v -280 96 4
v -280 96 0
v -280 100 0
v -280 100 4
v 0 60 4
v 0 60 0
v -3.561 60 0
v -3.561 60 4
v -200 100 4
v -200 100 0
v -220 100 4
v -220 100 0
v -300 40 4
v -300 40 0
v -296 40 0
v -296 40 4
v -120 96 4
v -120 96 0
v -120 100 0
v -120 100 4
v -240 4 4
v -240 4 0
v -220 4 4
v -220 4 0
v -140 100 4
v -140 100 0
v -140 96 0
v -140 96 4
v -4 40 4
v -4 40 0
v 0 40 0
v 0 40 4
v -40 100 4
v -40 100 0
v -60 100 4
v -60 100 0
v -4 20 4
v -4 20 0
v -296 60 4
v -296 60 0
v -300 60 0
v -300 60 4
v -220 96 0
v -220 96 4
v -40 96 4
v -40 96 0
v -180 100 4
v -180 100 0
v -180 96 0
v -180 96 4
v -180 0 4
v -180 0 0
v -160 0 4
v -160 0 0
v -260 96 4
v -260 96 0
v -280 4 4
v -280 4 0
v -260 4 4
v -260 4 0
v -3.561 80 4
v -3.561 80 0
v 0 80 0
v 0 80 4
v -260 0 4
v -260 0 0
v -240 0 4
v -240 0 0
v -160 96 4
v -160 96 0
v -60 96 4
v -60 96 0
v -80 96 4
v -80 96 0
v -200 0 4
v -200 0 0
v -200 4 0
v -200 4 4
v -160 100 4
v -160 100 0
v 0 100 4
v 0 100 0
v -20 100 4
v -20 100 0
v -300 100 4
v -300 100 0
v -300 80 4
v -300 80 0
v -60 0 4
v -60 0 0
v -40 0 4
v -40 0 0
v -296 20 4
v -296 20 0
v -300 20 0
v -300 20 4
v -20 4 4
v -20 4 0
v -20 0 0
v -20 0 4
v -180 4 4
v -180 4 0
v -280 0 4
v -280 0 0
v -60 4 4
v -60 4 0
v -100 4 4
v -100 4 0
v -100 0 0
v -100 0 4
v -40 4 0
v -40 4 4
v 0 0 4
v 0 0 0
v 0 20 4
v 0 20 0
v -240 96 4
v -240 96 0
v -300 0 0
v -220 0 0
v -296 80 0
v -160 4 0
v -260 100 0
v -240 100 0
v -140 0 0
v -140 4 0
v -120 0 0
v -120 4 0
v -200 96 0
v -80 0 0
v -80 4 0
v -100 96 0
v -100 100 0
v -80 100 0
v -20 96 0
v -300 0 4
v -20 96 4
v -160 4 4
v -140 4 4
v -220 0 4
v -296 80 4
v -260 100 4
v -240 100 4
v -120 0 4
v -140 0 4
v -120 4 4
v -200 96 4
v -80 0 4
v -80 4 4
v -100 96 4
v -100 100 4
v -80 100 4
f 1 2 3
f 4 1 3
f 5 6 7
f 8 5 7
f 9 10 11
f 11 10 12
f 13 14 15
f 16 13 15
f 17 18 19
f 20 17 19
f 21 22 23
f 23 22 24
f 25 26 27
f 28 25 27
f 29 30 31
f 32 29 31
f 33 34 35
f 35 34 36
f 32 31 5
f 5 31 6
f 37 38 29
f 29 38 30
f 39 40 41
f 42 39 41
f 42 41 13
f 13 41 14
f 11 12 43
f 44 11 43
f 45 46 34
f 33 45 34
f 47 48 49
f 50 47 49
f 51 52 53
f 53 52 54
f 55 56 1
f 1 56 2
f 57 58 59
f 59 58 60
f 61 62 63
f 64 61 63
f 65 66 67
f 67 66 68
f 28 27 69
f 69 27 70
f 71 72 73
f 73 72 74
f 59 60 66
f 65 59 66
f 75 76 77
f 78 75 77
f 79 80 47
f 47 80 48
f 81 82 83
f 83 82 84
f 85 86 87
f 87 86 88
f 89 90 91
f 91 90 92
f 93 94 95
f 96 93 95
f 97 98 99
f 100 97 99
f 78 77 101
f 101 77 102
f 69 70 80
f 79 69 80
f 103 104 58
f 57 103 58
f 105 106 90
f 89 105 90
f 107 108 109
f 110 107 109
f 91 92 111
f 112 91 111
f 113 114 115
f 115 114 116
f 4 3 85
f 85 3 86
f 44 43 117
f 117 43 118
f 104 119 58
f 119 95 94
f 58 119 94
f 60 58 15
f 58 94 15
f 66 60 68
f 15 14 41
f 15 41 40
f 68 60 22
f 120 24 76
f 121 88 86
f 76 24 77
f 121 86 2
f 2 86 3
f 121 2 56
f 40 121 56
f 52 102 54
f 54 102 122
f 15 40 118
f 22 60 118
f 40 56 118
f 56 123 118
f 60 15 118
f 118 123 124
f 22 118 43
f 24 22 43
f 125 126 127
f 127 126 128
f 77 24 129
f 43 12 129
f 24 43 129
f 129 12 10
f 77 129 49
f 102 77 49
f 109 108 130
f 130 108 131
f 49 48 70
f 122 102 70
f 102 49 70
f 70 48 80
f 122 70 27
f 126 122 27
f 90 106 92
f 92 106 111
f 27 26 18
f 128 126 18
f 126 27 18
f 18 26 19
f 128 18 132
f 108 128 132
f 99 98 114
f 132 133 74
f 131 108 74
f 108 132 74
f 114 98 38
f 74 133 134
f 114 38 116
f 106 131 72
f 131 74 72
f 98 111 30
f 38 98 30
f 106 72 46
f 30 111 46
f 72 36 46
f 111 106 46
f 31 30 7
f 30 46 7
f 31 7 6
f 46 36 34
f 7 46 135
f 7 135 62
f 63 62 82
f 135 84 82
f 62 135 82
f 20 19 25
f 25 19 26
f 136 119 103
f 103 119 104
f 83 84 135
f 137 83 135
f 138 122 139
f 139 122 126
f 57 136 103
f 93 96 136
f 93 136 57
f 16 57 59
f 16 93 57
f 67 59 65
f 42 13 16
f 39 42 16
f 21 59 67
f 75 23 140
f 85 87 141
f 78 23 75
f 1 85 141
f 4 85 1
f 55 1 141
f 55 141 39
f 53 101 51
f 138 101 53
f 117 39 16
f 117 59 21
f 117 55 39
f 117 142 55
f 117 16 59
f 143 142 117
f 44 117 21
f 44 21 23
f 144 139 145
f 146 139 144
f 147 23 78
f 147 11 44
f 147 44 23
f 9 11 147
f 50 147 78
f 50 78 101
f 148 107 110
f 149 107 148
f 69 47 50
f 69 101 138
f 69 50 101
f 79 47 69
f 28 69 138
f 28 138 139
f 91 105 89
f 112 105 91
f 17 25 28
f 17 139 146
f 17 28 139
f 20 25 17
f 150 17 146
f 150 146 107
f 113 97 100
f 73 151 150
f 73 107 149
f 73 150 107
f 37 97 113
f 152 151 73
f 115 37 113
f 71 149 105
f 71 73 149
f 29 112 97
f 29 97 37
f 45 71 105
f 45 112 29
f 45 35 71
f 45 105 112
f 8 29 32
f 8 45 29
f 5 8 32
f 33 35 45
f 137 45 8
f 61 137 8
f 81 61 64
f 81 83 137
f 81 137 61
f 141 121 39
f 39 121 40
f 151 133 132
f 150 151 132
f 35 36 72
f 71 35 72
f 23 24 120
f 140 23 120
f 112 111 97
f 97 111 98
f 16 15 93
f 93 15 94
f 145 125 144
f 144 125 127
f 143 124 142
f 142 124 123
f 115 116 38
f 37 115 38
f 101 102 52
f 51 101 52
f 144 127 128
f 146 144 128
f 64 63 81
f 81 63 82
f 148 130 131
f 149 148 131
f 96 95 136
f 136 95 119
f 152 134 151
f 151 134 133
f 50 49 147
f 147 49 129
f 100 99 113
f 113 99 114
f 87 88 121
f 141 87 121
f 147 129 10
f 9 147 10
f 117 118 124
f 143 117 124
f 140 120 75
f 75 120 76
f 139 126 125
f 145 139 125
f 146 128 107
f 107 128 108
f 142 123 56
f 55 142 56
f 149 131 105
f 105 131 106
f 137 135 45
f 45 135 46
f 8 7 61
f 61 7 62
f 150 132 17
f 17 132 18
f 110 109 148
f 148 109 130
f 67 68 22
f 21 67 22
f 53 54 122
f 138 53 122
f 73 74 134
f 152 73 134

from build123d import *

# Parameters (mm, degrees)
F1_DEPTH = 4


with BuildPart() as f1:
    # F0 (on Top) → F1 (new body)
    with BuildSketch(Plane.XY):
        Polygon((-20, 0), (0, 0), (0, 20), (-4, 20), (-4, 40), (0, 40), (0, 60), (-3.561152, 60), (-3.561152, 80), (0, 80), (0, 100), (-20, 100), (-20, 96), (-40, 96), (-40, 100), (-60, 100), (-60, 96), (-80, 96), (-80, 100), (-100, 100), (-100, 96), (-120, 96), (-120, 100), (-140, 100), (-140, 96), (-160, 96), (-160, 100), (-180, 100), (-180, 96), (-200, 96), (-200, 100), (-220, 100), (-220, 96), (-240, 96), (-240, 100), (-260, 100), (-260, 96), (-280, 96), (-280, 100), (-300, 100), (-300, 80), (-296, 80), (-296, 60), (-300, 60), (-300, 40), (-296, 40), (-296, 20), (-300, 20), (-300, 0), (-280, 0), (-280, 4), (-260, 4), (-260, 0), (-240, 0), (-240, 4), (-220, 4), (-220, 0), (-200, 0), (-200, 4), (-180, 4), (-180, 0), (-160, 0), (-160, 4), (-140, 4), (-140, 0), (-120, 0), (-120, 4), (-100, 4), (-100, 0), (-80, 0), (-80, 4), (-60, 4), (-60, 0), (-40, 0), (-40, 4), (-20, 4), align=None)
    extrude(amount=F1_DEPTH)


solid = f1.part
